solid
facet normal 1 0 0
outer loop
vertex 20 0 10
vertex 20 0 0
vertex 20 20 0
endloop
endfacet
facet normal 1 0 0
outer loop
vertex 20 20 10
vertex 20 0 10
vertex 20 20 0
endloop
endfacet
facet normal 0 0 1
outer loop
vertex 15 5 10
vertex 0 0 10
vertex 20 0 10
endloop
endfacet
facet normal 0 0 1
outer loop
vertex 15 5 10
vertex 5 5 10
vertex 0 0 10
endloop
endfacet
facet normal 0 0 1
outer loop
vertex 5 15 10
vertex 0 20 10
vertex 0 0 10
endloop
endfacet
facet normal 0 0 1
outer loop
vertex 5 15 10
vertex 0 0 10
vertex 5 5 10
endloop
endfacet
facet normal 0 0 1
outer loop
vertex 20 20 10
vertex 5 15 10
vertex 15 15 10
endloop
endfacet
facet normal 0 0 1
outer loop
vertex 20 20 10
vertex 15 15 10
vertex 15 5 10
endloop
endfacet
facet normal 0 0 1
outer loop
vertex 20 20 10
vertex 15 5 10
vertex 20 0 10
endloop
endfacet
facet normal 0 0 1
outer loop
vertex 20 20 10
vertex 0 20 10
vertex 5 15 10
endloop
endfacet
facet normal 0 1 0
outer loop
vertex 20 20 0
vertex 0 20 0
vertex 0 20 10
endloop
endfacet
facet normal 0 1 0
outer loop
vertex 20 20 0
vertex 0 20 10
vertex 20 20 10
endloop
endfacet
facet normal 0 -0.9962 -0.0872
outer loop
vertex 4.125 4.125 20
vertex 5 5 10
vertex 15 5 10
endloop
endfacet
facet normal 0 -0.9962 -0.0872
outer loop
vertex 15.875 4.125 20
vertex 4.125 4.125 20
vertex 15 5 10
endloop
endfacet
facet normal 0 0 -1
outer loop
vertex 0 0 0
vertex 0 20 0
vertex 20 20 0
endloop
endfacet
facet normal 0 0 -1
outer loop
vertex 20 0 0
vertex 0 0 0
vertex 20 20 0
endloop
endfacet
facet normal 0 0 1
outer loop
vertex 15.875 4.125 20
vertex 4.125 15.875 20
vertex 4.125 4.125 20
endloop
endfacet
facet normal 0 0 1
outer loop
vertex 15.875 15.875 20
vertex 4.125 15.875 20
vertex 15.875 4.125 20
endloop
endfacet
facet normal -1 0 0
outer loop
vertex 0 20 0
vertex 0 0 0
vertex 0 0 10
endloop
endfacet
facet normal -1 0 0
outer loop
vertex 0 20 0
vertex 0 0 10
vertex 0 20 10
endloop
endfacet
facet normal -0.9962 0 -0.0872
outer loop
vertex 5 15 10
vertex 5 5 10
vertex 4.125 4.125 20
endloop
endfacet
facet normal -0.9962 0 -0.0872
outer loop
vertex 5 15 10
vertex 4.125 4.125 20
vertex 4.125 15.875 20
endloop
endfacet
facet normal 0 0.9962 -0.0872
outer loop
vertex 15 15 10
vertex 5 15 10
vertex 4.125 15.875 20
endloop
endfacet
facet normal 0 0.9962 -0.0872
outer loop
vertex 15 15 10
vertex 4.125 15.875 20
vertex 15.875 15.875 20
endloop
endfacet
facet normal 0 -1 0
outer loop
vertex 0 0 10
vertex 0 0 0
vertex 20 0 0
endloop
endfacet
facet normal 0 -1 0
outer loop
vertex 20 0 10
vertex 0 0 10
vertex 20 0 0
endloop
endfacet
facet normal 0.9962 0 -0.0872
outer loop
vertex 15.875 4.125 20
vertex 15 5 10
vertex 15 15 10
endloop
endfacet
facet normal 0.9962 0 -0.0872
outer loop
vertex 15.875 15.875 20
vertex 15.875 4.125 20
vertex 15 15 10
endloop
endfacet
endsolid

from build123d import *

# Parameters (mm, degrees)
SKETCH_1_W         = 20
SKETCH_1_H         = 20
BASEBOX_DEPTH      = 10
SKETCH_2_W         = 10
SKETCH_2_H         = 10
DRAFTOUTWARD_DEPTH = 10
DRAFTOUTWARD_DRAFT = -5


with BuildPart() as part:
    # 草图1 → BaseBox (new body)
    with BuildSketch(Plane.XY):
        with Locations((10, 10)):
            Rectangle(SKETCH_1_W, SKETCH_1_H)
    extrude(amount=BASEBOX_DEPTH)


with BuildPart() as draftoutward_tool:
    # 草图2 → DraftOutward (with draft: the straight prism first)
    with BuildSketch(Plane.XY.offset(10)):
        with Locations((10, 10)):
            Rectangle(SKETCH_2_W, SKETCH_2_H)
    extrude(amount=DRAFTOUTWARD_DEPTH)
    # DraftOutward: the draft: its side faces are tilted about the plane it starts from
    draftoutward_sides = [draftoutward_tool.faces().sort_by_distance(p)[0] for p in [
        (10, 5, 15),
        (15, 10, 15),
        (10, 15, 15),
        (5, 10, 15),
    ]]
    draft(draftoutward_sides, Plane.XY.offset(10), DRAFTOUTWARD_DRAFT)


with BuildPart() as part_1:
    add(part.part)

    # DraftOutward: add draftoutward_tool
    add(draftoutward_tool.part)


solid = part_1.part
